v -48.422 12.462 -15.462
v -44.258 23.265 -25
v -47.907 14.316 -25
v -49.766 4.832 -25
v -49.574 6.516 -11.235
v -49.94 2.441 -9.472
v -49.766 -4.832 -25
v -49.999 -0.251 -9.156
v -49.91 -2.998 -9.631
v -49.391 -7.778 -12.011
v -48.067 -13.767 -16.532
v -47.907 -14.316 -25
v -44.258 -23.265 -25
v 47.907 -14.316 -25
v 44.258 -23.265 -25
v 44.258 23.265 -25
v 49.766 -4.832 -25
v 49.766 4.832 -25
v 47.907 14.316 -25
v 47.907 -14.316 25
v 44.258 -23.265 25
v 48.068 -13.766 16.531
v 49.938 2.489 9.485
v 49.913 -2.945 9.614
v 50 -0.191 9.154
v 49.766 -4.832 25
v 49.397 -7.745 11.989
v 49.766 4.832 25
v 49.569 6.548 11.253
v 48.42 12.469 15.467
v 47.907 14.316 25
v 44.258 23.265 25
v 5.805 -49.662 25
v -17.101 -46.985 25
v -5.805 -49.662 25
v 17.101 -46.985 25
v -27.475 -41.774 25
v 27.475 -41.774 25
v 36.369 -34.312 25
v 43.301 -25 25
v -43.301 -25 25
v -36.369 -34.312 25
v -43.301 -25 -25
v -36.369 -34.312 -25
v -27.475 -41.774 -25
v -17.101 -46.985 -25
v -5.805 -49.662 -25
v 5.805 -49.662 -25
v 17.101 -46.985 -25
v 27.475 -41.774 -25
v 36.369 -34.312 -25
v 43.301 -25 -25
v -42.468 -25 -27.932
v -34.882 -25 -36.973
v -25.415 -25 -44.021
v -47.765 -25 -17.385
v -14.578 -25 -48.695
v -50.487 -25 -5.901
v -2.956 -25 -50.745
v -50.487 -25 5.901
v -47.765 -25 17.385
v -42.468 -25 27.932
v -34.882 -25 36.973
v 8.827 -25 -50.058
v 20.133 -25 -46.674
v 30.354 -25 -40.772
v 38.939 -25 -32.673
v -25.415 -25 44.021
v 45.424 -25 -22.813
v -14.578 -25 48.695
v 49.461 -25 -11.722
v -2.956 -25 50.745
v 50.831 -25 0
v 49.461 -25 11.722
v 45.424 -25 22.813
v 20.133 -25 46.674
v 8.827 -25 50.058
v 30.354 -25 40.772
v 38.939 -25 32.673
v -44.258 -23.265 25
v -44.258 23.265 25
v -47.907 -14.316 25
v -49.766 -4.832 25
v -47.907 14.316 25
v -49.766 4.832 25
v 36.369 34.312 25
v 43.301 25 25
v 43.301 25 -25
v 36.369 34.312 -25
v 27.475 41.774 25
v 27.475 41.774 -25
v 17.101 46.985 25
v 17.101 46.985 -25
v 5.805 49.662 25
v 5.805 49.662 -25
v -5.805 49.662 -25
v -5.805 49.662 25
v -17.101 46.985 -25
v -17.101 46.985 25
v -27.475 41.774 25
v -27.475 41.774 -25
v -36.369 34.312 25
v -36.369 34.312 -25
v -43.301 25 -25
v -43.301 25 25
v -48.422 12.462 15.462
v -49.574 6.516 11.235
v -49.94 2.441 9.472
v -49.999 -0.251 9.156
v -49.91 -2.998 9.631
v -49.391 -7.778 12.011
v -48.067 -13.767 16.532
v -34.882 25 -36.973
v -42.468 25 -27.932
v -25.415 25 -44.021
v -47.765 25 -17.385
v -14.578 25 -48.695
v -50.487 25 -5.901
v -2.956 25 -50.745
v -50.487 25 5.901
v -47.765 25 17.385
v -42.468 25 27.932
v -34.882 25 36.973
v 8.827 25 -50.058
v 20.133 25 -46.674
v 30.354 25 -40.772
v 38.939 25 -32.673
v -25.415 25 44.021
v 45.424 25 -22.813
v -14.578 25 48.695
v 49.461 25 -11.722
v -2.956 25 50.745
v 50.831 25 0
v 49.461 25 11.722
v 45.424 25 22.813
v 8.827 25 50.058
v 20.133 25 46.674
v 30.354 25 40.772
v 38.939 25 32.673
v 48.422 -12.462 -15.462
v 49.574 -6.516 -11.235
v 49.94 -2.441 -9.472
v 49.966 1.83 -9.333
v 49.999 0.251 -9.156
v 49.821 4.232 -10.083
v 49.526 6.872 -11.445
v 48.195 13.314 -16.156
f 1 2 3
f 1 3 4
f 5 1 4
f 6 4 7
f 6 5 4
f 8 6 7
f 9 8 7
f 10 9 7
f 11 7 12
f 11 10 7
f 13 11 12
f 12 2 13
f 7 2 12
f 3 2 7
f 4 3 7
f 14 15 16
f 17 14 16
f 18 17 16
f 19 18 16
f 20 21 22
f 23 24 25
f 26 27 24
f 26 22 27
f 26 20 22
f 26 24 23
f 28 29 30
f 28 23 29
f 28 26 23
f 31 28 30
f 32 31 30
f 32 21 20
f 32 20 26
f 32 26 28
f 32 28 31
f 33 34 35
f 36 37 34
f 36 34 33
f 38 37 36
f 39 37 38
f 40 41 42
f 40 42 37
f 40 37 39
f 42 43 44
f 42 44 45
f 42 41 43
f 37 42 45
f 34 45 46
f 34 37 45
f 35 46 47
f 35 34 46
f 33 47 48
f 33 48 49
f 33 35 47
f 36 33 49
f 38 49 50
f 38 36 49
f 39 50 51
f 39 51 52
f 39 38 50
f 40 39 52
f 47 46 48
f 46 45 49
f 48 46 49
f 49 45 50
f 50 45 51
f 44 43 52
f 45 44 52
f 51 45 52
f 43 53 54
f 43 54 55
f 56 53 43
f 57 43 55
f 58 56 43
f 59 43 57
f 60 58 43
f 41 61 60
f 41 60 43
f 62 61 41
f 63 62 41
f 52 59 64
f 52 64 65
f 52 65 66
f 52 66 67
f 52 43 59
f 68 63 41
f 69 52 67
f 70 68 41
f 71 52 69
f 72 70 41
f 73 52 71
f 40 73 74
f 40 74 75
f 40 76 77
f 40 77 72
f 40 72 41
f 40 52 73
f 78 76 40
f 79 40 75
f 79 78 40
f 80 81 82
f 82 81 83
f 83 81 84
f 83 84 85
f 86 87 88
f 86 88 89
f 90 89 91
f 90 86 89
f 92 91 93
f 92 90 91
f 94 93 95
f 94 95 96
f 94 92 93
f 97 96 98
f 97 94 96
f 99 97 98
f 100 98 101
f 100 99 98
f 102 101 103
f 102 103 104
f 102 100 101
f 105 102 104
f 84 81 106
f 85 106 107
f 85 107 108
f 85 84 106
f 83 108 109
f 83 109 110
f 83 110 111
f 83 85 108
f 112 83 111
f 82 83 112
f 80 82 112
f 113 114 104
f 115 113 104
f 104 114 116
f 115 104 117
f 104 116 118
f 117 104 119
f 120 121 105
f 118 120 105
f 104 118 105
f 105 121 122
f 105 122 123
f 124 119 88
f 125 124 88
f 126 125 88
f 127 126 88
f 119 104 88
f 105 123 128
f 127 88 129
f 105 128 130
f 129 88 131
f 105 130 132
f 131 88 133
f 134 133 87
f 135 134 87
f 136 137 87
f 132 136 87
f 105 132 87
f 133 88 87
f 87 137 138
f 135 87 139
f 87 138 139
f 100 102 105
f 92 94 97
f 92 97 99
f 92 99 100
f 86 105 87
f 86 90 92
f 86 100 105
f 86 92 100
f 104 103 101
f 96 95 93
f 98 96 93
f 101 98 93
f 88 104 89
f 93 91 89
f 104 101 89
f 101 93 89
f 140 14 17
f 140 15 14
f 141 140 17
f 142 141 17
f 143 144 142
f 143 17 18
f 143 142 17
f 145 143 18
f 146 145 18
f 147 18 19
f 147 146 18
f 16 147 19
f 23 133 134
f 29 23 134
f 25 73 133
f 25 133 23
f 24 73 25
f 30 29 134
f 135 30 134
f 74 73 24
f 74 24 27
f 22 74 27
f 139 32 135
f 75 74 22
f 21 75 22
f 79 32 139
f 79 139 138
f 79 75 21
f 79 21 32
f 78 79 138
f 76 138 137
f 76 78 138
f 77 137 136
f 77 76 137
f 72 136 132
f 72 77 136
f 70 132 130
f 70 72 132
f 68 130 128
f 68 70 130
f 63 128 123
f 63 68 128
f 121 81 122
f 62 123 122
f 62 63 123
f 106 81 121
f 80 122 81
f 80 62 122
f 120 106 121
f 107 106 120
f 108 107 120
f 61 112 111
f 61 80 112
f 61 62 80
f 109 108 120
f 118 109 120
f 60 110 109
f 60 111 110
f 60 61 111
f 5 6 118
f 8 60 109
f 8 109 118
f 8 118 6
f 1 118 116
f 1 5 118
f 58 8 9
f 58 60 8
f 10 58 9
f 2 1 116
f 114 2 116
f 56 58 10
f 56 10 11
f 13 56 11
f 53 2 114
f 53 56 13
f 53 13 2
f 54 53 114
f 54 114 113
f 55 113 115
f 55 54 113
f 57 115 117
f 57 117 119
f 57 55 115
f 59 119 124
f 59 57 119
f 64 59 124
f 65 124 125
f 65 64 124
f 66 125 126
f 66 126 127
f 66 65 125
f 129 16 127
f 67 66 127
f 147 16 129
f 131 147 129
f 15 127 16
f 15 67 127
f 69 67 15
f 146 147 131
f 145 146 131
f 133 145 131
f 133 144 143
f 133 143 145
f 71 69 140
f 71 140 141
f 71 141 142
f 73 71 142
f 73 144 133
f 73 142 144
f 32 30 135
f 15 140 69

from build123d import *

# Parameters (mm, degrees)
F1_R     = 50
F1_R_2   = 40
F3_DEPTH = 25
F2_R     = 50.8307141885
F2_R_2   = 38.5941106118
F2_R_3   = 3.4704975252
F4_DEPTH = 25


with BuildPart() as f3:
    # F1 (on face) → F3 (new body, symmetric)
    with BuildSketch(Plane.XY):
        Circle(F1_R)
        Circle(F1_R_2, mode=Mode.SUBTRACT)
        Circle(F1_R_2)
    extrude(amount=F3_DEPTH, both=True)

    # F2 (on Front) → F4 (join, symmetric)
    with BuildSketch(Plane.XZ):
        Circle(F2_R)
        Circle(F2_R_2, mode=Mode.SUBTRACT)
        Circle(F2_R_2)
        Circle(F2_R_3, mode=Mode.SUBTRACT)
    extrude(amount=F4_DEPTH, both=True)


solid = f3.part
